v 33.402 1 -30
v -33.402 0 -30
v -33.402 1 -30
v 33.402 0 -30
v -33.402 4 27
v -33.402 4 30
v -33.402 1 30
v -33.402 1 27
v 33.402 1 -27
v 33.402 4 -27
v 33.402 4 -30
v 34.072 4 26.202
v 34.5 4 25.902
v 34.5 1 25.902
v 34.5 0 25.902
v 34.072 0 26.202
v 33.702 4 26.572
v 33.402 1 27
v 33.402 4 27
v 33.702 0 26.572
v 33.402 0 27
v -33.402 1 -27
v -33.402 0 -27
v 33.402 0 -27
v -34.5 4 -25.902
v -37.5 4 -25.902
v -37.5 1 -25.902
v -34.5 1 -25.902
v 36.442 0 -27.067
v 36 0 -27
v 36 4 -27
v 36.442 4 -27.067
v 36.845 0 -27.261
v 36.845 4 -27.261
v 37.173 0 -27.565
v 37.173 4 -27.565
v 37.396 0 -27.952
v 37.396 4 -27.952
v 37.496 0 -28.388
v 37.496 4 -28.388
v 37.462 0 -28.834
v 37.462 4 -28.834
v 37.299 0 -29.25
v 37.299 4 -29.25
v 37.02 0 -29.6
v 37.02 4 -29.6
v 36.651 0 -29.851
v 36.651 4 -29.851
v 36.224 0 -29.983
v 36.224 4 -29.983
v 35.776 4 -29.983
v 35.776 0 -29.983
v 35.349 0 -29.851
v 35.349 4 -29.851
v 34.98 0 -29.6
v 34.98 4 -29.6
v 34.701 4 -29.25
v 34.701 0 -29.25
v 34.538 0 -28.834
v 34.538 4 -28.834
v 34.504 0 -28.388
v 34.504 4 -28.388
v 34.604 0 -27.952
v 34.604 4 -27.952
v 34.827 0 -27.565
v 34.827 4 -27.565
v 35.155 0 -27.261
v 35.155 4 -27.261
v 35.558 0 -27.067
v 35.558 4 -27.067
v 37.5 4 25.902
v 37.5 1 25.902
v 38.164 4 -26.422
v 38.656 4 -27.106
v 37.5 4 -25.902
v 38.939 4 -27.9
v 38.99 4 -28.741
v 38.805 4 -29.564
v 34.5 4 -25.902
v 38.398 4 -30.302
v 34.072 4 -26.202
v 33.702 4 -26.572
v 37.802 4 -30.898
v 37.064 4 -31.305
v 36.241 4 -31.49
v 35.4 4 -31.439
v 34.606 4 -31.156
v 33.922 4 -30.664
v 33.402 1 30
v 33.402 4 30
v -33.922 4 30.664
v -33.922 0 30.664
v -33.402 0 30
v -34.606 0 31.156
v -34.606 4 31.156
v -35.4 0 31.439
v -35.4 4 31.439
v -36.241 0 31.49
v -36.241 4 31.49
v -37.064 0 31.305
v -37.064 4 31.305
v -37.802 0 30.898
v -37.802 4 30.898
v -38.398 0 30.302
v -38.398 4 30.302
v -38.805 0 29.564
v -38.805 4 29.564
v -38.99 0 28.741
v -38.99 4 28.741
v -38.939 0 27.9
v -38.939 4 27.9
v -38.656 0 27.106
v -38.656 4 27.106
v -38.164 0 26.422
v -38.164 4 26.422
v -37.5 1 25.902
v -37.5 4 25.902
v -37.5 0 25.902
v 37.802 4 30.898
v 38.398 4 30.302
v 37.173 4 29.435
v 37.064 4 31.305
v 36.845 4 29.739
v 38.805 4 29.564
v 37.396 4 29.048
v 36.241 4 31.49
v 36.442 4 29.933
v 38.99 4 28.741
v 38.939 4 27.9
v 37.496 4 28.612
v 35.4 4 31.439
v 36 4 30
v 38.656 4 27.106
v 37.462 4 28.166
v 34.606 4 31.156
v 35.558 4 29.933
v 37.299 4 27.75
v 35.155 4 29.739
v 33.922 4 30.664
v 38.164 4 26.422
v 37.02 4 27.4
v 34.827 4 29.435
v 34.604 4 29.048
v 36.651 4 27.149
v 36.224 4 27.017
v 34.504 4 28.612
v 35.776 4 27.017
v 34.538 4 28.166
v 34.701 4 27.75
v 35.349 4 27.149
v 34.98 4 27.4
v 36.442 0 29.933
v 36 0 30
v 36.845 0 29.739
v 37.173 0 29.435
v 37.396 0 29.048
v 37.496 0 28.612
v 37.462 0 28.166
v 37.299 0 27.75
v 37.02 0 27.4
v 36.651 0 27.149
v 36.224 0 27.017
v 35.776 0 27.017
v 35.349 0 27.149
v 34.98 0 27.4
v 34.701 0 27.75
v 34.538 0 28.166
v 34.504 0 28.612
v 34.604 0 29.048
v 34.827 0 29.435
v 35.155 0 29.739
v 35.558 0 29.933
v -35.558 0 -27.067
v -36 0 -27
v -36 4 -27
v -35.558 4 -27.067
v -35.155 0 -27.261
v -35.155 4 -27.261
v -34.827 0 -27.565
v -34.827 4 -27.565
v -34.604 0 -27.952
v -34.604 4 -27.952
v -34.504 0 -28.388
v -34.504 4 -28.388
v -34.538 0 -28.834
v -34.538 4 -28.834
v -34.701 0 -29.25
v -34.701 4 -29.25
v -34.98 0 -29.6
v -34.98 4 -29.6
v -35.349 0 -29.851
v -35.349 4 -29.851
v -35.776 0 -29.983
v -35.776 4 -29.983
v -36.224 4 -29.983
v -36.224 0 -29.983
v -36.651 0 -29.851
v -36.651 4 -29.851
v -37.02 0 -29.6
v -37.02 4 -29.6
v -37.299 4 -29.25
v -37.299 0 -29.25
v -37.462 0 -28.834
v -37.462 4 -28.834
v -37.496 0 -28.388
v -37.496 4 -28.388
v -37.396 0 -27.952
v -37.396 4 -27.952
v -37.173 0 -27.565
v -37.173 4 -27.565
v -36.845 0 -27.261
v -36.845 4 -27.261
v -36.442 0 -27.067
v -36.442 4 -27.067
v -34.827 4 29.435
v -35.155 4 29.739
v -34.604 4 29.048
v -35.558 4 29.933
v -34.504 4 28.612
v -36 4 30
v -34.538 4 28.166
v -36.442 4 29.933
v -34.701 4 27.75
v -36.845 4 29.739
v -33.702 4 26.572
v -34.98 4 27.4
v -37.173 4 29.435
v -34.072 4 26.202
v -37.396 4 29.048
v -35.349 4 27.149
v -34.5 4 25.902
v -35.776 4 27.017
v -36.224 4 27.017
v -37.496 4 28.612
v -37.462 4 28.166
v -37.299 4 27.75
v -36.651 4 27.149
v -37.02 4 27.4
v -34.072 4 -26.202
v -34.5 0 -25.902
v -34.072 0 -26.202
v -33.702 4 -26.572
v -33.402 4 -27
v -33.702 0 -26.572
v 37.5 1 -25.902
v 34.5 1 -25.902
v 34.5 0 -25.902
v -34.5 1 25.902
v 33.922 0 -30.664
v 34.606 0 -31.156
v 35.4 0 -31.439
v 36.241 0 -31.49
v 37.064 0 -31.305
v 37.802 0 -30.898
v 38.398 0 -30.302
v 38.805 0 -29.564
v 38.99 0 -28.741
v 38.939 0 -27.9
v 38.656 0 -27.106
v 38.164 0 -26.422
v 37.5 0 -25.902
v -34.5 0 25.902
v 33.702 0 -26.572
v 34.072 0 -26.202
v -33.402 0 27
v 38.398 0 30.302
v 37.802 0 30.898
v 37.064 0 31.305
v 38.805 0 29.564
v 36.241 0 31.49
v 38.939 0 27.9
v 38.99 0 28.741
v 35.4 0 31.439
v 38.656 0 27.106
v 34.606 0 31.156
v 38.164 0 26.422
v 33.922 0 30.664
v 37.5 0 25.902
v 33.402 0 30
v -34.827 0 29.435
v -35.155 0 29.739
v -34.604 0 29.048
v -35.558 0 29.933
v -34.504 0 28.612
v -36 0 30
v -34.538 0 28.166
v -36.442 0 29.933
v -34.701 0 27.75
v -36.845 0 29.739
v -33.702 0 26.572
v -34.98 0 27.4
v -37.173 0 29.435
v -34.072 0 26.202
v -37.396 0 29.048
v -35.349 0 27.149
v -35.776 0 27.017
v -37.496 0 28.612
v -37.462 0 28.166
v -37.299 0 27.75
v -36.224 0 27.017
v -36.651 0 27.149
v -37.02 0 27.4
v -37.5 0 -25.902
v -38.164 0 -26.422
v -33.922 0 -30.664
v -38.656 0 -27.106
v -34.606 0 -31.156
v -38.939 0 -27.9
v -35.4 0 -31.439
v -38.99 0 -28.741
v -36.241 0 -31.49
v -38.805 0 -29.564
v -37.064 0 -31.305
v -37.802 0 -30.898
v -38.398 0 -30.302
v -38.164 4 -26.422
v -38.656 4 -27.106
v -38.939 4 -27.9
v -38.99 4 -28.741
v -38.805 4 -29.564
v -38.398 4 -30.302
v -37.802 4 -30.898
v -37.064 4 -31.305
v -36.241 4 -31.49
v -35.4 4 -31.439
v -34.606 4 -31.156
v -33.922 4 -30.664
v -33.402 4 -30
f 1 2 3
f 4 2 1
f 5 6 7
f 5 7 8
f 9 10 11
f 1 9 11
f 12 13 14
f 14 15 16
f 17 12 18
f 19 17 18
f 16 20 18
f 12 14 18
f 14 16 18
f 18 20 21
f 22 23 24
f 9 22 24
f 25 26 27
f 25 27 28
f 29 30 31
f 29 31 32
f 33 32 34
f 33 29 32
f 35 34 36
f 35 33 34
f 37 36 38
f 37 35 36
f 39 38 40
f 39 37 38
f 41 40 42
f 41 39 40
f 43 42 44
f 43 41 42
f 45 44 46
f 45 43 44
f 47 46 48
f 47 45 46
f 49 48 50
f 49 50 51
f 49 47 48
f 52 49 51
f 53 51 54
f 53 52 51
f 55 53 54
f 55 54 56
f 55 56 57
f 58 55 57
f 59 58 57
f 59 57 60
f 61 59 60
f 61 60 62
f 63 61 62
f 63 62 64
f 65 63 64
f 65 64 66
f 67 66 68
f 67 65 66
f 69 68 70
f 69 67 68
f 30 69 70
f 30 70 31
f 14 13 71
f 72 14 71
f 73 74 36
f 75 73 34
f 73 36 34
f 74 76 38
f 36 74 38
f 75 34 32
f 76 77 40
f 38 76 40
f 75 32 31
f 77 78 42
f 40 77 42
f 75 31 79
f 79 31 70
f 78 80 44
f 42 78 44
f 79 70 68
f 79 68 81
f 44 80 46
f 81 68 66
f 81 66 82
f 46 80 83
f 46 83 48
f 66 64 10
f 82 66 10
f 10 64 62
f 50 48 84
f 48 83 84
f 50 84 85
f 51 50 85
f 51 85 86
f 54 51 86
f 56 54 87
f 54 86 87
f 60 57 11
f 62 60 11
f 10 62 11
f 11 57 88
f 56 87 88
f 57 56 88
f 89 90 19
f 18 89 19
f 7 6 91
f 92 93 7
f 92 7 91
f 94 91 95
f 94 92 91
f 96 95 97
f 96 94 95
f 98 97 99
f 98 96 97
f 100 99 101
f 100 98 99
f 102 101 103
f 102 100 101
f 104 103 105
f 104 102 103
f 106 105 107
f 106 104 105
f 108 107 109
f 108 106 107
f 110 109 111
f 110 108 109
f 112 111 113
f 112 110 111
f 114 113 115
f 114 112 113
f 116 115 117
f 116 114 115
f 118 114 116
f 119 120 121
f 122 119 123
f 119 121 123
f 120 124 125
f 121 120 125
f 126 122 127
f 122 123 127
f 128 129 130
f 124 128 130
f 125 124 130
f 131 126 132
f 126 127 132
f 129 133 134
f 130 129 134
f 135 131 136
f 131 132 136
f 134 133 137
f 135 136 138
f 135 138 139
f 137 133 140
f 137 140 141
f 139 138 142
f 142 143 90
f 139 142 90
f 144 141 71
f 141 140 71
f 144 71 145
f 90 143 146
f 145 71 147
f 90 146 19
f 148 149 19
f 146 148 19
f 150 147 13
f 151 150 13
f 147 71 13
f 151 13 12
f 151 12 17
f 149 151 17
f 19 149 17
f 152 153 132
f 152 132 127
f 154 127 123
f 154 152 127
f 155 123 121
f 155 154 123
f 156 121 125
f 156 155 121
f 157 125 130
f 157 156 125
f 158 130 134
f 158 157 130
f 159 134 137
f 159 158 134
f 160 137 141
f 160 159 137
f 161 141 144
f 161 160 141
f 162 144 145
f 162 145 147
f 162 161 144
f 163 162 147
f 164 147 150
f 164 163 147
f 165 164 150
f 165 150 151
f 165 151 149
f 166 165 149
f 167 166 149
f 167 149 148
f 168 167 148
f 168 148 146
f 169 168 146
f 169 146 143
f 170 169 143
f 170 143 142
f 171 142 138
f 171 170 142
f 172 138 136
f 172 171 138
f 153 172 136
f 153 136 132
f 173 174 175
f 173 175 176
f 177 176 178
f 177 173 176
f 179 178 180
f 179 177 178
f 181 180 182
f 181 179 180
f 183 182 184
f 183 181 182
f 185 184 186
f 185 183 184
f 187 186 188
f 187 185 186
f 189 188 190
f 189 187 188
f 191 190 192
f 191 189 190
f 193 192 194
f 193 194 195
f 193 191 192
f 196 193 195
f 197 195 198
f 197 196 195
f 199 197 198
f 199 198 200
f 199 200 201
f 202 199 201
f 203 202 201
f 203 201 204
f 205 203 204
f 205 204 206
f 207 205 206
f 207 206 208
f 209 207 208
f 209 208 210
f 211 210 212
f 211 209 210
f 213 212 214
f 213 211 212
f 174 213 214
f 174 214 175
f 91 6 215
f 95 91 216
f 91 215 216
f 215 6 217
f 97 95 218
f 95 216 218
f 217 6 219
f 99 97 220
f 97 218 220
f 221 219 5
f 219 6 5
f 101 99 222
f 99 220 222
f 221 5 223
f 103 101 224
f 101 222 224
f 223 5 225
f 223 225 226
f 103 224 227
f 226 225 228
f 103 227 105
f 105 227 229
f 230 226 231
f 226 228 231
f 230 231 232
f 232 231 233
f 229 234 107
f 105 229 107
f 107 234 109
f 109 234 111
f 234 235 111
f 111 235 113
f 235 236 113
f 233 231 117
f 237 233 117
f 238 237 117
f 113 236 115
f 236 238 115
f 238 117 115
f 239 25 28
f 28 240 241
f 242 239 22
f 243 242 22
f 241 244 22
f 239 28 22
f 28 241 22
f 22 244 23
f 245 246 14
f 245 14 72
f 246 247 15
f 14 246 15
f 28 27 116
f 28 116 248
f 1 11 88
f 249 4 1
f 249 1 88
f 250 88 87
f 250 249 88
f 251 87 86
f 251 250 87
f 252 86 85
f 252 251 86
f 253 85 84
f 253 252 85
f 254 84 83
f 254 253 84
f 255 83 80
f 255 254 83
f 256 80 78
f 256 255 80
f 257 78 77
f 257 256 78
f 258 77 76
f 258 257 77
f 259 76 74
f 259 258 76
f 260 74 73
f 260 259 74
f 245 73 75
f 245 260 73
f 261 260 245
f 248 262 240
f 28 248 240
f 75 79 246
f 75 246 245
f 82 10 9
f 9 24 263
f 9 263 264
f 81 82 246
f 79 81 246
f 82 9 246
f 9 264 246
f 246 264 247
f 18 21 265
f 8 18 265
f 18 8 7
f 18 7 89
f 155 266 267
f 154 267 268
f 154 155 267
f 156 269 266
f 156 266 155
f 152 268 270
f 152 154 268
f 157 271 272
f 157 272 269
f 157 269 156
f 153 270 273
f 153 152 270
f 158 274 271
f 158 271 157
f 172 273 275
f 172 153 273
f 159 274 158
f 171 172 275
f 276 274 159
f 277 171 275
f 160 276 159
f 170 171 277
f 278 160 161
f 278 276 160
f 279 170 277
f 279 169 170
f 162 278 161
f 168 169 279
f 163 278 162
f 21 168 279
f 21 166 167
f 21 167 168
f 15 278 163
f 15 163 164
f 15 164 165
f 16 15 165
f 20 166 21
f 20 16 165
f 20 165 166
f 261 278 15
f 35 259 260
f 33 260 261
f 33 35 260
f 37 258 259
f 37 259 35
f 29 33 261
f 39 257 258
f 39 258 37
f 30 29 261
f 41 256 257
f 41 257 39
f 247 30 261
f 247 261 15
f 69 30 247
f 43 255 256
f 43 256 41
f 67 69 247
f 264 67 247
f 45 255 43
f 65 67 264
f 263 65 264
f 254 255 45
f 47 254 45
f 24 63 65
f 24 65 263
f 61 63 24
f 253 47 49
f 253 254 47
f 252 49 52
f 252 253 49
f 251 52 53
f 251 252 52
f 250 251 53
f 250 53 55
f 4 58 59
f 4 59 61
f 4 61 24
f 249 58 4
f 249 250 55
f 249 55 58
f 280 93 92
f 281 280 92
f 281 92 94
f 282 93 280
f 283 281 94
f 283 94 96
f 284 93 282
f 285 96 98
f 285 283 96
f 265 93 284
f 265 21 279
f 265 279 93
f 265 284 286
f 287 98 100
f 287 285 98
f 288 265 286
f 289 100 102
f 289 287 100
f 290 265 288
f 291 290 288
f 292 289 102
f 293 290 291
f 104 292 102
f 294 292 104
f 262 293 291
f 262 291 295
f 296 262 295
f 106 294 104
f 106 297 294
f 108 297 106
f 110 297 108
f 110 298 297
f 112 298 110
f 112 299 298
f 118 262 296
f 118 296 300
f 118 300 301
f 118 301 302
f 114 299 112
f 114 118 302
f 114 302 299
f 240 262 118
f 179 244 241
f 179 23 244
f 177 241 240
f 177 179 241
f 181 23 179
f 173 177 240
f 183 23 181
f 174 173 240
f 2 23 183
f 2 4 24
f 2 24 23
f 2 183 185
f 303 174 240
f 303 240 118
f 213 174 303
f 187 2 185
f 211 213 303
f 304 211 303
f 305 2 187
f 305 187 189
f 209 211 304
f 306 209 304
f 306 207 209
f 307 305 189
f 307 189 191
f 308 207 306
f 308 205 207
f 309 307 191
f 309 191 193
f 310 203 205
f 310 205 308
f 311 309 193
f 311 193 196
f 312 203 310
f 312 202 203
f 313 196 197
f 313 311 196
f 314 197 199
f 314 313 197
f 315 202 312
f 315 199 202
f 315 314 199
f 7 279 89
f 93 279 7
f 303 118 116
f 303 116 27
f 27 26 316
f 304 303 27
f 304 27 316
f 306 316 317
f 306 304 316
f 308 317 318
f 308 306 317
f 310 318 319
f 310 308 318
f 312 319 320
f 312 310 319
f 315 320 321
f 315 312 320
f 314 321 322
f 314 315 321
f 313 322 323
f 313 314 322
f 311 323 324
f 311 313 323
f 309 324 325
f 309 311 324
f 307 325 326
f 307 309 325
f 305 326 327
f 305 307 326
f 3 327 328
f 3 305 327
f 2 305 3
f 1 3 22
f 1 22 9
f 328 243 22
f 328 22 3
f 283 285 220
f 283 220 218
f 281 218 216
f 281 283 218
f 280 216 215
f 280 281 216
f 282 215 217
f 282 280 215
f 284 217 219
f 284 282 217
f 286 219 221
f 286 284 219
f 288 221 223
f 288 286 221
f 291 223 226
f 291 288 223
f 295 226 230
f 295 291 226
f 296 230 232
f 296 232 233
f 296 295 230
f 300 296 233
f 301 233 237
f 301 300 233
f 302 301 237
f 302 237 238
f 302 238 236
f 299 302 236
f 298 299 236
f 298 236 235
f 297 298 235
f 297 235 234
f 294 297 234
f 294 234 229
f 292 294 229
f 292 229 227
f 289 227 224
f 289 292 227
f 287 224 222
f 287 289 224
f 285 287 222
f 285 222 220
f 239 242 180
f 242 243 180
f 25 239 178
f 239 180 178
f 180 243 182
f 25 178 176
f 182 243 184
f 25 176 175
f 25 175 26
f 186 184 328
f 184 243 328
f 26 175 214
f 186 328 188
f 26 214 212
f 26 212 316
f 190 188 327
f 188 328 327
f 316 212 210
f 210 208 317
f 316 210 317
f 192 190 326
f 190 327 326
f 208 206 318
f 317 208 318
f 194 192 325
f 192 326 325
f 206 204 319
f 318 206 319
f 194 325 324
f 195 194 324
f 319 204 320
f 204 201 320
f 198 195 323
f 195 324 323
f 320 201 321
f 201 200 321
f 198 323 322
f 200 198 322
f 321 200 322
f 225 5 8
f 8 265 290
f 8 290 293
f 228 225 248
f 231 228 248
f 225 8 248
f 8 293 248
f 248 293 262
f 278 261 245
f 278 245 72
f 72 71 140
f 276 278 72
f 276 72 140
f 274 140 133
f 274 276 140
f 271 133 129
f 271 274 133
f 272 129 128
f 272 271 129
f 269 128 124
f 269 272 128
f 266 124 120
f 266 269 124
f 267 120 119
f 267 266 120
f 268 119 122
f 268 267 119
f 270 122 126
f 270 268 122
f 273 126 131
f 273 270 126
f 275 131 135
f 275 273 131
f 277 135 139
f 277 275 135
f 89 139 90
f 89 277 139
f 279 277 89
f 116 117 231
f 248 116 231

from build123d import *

# Parameters (mm, degrees)
SKETCH1_R           = 1.5
BOSS_EXTRUDE1_DEPTH = 4
SKETCH2_W           = 3
SKETCH2_H           = 51.803847578
SKETCH2_W_2         = 66.803847578
SKETCH2_H_2         = 3
CUT_EXTRUDE1_DEPTH  = 3


with BuildPart() as part:
    # Sketch1 → Boss-Extrude1 (new body)
    with BuildSketch(Plane(origin=(0, 0, 0), x_dir=(1, 0, 0), z_dir=(0, 1, 0))):
        with BuildLine():
            Line((-33.401923789, 30), (33.401923789, 30))
            ThreePointArc((33.401923789, 30), (38.121320344, 30.621320344), (37.5, 25.901923789))
            Line((37.5, 25.901923789), (37.5, -25.901923789))
            ThreePointArc((37.5, -25.901923789), (38.121320344, -30.621320344), (33.401923789, -30))
            Line((33.401923789, -30), (-33.401923789, -30))
            ThreePointArc((-33.401923789, -30), (-38.121320344, -30.621320344), (-37.5, -25.901923789))
            Line((-37.5, -25.901923789), (-37.5, 25.901923789))
            ThreePointArc((-37.5, 25.901923789), (-38.121320344, 30.621320344), (-33.401923789, 30))
        make_face()
        with Locations(Location((36, 28.5, 0), (0, 0, 270))):
            Circle(SKETCH1_R, mode=Mode.SUBTRACT)
        with Locations(Location((36, -28.5, 0), (0, 0, 270))):
            Circle(SKETCH1_R, mode=Mode.SUBTRACT)
        with Locations(Location((-36, -28.5, 0), (0, 0, 270))):
            Circle(SKETCH1_R, mode=Mode.SUBTRACT)
        with Locations(Location((-36, 28.5, 0), (0, 0, 270))):
            Circle(SKETCH1_R, mode=Mode.SUBTRACT)
        with BuildLine():
            Line((-33.401923789, 27), (33.401923789, 27))
            ThreePointArc((33.401923789, 27), (33.878679656, 26.378679656), (34.5, 25.901923789))
            Line((34.5, 25.901923789), (34.5, -25.901923789))
            ThreePointArc((34.5, -25.901923789), (33.878679656, -26.378679656), (33.401923789, -27))
            Line((33.401923789, -27), (-33.401923789, -27))
            ThreePointArc((-33.401923789, -27), (-33.878679656, -26.378679656), (-34.5, -25.901923789))
            Line((-34.5, -25.901923789), (-34.5, 25.901923789))
            ThreePointArc((-34.5, 25.901923789), (-33.878679656, 26.378679656), (-33.401923789, 27))
        make_face(mode=Mode.SUBTRACT)
    extrude(amount=BOSS_EXTRUDE1_DEPTH)

    # Sketch2 → Cut-Extrude1 (cut)
    with BuildSketch(Plane(origin=(0, 4, 0), x_dir=(1, 0, 0), z_dir=(0, 1, 0))):
        with Locations((-36, 0)):
            Rectangle(SKETCH2_W, SKETCH2_H)
        with Locations((0, -28.5)):
            Rectangle(SKETCH2_W_2, SKETCH2_H_2)
        with Locations((36, 0)):
            Rectangle(SKETCH2_W, SKETCH2_H)
        with Locations((0, 28.5)):
            Rectangle(SKETCH2_W_2, SKETCH2_H_2)
    extrude(amount=-CUT_EXTRUDE1_DEPTH, mode=Mode.SUBTRACT)


solid = part.part
